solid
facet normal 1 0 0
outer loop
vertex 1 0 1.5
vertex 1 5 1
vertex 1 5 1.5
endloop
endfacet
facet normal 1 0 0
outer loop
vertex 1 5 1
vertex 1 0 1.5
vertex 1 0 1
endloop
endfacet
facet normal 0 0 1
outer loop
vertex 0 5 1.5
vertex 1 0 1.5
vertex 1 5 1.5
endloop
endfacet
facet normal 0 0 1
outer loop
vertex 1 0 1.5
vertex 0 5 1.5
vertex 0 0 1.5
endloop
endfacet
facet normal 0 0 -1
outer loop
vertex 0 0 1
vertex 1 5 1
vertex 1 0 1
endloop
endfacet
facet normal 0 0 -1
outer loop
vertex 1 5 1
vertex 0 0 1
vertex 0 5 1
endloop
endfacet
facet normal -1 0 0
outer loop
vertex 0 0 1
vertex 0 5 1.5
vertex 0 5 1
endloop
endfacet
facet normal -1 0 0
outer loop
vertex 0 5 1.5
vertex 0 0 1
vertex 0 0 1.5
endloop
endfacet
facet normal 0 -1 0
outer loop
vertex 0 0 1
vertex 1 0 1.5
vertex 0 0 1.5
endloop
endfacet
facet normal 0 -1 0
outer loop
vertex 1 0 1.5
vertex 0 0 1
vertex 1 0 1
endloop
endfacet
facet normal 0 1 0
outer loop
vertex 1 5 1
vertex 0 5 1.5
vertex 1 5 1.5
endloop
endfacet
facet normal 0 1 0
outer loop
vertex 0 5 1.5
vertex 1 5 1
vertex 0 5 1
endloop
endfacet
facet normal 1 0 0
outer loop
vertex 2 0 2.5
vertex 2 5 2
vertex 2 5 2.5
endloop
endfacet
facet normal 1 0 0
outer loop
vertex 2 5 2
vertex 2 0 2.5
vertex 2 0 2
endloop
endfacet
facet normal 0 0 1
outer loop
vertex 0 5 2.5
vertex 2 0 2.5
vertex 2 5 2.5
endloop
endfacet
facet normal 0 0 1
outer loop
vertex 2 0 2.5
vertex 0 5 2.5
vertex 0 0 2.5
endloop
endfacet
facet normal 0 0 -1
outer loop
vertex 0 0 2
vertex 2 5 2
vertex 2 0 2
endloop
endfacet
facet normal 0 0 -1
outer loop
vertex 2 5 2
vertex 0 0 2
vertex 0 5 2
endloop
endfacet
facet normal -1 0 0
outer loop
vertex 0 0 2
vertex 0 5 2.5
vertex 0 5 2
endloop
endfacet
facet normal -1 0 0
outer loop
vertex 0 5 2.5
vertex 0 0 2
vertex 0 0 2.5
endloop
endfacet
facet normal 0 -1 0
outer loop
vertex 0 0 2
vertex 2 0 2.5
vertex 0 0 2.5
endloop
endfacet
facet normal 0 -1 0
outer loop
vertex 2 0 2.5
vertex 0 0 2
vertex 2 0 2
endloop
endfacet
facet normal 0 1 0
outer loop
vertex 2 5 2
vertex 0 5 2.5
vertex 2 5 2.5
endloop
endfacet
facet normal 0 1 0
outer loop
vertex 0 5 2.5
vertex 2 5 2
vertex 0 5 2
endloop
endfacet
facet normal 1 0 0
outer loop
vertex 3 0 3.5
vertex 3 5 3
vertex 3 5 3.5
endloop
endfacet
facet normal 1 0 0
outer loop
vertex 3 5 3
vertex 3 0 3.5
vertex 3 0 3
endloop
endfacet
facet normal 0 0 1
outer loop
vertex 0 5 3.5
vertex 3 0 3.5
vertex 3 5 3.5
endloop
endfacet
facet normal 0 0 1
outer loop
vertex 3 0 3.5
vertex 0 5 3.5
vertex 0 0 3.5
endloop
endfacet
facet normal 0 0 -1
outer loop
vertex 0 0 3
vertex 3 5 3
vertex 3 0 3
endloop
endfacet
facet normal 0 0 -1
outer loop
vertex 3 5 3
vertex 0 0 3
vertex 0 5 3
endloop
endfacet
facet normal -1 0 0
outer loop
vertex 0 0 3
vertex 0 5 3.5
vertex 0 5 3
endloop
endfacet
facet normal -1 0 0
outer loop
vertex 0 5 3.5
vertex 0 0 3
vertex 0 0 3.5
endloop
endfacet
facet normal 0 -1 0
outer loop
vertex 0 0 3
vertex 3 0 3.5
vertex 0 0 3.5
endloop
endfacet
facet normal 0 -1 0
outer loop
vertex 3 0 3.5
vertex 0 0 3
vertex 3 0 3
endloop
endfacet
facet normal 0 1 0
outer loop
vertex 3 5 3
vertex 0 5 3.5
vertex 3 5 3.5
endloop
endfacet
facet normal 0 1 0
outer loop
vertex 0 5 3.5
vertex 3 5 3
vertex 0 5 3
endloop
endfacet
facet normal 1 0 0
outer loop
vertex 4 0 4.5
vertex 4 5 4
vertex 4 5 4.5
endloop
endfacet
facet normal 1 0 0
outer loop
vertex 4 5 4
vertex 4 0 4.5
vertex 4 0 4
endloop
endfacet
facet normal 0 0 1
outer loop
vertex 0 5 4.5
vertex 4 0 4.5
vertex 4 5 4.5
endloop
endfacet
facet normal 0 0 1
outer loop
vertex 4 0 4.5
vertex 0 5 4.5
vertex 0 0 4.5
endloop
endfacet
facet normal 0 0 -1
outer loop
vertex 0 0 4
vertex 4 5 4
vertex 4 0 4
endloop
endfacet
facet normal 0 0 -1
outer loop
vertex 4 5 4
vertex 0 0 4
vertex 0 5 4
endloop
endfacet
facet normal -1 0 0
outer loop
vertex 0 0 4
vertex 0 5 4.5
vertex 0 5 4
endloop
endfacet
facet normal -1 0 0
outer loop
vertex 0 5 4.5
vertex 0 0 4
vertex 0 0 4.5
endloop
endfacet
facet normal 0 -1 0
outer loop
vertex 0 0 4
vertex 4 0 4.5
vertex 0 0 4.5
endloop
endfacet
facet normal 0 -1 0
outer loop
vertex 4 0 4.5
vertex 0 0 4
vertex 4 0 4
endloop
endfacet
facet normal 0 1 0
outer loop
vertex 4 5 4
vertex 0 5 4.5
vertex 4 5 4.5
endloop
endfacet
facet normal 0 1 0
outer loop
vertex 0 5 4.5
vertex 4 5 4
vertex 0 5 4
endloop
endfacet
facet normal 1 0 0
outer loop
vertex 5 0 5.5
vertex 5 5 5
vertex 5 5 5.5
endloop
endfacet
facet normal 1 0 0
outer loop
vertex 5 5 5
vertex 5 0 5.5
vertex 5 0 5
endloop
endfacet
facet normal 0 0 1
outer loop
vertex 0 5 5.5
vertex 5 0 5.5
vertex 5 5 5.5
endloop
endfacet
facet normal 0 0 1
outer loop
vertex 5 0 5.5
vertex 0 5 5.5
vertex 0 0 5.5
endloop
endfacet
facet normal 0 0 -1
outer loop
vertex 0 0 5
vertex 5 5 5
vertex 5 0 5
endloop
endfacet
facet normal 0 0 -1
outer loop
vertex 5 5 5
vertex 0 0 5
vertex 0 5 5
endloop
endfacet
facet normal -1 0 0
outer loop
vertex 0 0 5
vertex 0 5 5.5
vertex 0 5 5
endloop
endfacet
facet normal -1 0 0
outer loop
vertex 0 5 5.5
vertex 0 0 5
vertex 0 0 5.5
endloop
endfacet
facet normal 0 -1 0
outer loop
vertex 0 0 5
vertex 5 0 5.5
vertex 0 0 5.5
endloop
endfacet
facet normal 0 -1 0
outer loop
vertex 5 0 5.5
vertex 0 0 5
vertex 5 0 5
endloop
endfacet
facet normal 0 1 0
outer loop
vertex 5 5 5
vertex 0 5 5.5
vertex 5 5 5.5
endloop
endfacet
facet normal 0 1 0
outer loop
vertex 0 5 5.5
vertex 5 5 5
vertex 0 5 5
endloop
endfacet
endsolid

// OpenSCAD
for(i=[0:2:10])
    for(j=[0,1]) echo(i+j);

for(i=[0:2:10],j=[0,1])
    echo(i+j);

for(i=[0:2:10],j=[0,1],k=[0,0.1,0.2])
    echo(i+j+k);

for(length=[1:5], width=[1:5]) {
    translate([0,0,length]) cube([length,width,0.5]);
}
